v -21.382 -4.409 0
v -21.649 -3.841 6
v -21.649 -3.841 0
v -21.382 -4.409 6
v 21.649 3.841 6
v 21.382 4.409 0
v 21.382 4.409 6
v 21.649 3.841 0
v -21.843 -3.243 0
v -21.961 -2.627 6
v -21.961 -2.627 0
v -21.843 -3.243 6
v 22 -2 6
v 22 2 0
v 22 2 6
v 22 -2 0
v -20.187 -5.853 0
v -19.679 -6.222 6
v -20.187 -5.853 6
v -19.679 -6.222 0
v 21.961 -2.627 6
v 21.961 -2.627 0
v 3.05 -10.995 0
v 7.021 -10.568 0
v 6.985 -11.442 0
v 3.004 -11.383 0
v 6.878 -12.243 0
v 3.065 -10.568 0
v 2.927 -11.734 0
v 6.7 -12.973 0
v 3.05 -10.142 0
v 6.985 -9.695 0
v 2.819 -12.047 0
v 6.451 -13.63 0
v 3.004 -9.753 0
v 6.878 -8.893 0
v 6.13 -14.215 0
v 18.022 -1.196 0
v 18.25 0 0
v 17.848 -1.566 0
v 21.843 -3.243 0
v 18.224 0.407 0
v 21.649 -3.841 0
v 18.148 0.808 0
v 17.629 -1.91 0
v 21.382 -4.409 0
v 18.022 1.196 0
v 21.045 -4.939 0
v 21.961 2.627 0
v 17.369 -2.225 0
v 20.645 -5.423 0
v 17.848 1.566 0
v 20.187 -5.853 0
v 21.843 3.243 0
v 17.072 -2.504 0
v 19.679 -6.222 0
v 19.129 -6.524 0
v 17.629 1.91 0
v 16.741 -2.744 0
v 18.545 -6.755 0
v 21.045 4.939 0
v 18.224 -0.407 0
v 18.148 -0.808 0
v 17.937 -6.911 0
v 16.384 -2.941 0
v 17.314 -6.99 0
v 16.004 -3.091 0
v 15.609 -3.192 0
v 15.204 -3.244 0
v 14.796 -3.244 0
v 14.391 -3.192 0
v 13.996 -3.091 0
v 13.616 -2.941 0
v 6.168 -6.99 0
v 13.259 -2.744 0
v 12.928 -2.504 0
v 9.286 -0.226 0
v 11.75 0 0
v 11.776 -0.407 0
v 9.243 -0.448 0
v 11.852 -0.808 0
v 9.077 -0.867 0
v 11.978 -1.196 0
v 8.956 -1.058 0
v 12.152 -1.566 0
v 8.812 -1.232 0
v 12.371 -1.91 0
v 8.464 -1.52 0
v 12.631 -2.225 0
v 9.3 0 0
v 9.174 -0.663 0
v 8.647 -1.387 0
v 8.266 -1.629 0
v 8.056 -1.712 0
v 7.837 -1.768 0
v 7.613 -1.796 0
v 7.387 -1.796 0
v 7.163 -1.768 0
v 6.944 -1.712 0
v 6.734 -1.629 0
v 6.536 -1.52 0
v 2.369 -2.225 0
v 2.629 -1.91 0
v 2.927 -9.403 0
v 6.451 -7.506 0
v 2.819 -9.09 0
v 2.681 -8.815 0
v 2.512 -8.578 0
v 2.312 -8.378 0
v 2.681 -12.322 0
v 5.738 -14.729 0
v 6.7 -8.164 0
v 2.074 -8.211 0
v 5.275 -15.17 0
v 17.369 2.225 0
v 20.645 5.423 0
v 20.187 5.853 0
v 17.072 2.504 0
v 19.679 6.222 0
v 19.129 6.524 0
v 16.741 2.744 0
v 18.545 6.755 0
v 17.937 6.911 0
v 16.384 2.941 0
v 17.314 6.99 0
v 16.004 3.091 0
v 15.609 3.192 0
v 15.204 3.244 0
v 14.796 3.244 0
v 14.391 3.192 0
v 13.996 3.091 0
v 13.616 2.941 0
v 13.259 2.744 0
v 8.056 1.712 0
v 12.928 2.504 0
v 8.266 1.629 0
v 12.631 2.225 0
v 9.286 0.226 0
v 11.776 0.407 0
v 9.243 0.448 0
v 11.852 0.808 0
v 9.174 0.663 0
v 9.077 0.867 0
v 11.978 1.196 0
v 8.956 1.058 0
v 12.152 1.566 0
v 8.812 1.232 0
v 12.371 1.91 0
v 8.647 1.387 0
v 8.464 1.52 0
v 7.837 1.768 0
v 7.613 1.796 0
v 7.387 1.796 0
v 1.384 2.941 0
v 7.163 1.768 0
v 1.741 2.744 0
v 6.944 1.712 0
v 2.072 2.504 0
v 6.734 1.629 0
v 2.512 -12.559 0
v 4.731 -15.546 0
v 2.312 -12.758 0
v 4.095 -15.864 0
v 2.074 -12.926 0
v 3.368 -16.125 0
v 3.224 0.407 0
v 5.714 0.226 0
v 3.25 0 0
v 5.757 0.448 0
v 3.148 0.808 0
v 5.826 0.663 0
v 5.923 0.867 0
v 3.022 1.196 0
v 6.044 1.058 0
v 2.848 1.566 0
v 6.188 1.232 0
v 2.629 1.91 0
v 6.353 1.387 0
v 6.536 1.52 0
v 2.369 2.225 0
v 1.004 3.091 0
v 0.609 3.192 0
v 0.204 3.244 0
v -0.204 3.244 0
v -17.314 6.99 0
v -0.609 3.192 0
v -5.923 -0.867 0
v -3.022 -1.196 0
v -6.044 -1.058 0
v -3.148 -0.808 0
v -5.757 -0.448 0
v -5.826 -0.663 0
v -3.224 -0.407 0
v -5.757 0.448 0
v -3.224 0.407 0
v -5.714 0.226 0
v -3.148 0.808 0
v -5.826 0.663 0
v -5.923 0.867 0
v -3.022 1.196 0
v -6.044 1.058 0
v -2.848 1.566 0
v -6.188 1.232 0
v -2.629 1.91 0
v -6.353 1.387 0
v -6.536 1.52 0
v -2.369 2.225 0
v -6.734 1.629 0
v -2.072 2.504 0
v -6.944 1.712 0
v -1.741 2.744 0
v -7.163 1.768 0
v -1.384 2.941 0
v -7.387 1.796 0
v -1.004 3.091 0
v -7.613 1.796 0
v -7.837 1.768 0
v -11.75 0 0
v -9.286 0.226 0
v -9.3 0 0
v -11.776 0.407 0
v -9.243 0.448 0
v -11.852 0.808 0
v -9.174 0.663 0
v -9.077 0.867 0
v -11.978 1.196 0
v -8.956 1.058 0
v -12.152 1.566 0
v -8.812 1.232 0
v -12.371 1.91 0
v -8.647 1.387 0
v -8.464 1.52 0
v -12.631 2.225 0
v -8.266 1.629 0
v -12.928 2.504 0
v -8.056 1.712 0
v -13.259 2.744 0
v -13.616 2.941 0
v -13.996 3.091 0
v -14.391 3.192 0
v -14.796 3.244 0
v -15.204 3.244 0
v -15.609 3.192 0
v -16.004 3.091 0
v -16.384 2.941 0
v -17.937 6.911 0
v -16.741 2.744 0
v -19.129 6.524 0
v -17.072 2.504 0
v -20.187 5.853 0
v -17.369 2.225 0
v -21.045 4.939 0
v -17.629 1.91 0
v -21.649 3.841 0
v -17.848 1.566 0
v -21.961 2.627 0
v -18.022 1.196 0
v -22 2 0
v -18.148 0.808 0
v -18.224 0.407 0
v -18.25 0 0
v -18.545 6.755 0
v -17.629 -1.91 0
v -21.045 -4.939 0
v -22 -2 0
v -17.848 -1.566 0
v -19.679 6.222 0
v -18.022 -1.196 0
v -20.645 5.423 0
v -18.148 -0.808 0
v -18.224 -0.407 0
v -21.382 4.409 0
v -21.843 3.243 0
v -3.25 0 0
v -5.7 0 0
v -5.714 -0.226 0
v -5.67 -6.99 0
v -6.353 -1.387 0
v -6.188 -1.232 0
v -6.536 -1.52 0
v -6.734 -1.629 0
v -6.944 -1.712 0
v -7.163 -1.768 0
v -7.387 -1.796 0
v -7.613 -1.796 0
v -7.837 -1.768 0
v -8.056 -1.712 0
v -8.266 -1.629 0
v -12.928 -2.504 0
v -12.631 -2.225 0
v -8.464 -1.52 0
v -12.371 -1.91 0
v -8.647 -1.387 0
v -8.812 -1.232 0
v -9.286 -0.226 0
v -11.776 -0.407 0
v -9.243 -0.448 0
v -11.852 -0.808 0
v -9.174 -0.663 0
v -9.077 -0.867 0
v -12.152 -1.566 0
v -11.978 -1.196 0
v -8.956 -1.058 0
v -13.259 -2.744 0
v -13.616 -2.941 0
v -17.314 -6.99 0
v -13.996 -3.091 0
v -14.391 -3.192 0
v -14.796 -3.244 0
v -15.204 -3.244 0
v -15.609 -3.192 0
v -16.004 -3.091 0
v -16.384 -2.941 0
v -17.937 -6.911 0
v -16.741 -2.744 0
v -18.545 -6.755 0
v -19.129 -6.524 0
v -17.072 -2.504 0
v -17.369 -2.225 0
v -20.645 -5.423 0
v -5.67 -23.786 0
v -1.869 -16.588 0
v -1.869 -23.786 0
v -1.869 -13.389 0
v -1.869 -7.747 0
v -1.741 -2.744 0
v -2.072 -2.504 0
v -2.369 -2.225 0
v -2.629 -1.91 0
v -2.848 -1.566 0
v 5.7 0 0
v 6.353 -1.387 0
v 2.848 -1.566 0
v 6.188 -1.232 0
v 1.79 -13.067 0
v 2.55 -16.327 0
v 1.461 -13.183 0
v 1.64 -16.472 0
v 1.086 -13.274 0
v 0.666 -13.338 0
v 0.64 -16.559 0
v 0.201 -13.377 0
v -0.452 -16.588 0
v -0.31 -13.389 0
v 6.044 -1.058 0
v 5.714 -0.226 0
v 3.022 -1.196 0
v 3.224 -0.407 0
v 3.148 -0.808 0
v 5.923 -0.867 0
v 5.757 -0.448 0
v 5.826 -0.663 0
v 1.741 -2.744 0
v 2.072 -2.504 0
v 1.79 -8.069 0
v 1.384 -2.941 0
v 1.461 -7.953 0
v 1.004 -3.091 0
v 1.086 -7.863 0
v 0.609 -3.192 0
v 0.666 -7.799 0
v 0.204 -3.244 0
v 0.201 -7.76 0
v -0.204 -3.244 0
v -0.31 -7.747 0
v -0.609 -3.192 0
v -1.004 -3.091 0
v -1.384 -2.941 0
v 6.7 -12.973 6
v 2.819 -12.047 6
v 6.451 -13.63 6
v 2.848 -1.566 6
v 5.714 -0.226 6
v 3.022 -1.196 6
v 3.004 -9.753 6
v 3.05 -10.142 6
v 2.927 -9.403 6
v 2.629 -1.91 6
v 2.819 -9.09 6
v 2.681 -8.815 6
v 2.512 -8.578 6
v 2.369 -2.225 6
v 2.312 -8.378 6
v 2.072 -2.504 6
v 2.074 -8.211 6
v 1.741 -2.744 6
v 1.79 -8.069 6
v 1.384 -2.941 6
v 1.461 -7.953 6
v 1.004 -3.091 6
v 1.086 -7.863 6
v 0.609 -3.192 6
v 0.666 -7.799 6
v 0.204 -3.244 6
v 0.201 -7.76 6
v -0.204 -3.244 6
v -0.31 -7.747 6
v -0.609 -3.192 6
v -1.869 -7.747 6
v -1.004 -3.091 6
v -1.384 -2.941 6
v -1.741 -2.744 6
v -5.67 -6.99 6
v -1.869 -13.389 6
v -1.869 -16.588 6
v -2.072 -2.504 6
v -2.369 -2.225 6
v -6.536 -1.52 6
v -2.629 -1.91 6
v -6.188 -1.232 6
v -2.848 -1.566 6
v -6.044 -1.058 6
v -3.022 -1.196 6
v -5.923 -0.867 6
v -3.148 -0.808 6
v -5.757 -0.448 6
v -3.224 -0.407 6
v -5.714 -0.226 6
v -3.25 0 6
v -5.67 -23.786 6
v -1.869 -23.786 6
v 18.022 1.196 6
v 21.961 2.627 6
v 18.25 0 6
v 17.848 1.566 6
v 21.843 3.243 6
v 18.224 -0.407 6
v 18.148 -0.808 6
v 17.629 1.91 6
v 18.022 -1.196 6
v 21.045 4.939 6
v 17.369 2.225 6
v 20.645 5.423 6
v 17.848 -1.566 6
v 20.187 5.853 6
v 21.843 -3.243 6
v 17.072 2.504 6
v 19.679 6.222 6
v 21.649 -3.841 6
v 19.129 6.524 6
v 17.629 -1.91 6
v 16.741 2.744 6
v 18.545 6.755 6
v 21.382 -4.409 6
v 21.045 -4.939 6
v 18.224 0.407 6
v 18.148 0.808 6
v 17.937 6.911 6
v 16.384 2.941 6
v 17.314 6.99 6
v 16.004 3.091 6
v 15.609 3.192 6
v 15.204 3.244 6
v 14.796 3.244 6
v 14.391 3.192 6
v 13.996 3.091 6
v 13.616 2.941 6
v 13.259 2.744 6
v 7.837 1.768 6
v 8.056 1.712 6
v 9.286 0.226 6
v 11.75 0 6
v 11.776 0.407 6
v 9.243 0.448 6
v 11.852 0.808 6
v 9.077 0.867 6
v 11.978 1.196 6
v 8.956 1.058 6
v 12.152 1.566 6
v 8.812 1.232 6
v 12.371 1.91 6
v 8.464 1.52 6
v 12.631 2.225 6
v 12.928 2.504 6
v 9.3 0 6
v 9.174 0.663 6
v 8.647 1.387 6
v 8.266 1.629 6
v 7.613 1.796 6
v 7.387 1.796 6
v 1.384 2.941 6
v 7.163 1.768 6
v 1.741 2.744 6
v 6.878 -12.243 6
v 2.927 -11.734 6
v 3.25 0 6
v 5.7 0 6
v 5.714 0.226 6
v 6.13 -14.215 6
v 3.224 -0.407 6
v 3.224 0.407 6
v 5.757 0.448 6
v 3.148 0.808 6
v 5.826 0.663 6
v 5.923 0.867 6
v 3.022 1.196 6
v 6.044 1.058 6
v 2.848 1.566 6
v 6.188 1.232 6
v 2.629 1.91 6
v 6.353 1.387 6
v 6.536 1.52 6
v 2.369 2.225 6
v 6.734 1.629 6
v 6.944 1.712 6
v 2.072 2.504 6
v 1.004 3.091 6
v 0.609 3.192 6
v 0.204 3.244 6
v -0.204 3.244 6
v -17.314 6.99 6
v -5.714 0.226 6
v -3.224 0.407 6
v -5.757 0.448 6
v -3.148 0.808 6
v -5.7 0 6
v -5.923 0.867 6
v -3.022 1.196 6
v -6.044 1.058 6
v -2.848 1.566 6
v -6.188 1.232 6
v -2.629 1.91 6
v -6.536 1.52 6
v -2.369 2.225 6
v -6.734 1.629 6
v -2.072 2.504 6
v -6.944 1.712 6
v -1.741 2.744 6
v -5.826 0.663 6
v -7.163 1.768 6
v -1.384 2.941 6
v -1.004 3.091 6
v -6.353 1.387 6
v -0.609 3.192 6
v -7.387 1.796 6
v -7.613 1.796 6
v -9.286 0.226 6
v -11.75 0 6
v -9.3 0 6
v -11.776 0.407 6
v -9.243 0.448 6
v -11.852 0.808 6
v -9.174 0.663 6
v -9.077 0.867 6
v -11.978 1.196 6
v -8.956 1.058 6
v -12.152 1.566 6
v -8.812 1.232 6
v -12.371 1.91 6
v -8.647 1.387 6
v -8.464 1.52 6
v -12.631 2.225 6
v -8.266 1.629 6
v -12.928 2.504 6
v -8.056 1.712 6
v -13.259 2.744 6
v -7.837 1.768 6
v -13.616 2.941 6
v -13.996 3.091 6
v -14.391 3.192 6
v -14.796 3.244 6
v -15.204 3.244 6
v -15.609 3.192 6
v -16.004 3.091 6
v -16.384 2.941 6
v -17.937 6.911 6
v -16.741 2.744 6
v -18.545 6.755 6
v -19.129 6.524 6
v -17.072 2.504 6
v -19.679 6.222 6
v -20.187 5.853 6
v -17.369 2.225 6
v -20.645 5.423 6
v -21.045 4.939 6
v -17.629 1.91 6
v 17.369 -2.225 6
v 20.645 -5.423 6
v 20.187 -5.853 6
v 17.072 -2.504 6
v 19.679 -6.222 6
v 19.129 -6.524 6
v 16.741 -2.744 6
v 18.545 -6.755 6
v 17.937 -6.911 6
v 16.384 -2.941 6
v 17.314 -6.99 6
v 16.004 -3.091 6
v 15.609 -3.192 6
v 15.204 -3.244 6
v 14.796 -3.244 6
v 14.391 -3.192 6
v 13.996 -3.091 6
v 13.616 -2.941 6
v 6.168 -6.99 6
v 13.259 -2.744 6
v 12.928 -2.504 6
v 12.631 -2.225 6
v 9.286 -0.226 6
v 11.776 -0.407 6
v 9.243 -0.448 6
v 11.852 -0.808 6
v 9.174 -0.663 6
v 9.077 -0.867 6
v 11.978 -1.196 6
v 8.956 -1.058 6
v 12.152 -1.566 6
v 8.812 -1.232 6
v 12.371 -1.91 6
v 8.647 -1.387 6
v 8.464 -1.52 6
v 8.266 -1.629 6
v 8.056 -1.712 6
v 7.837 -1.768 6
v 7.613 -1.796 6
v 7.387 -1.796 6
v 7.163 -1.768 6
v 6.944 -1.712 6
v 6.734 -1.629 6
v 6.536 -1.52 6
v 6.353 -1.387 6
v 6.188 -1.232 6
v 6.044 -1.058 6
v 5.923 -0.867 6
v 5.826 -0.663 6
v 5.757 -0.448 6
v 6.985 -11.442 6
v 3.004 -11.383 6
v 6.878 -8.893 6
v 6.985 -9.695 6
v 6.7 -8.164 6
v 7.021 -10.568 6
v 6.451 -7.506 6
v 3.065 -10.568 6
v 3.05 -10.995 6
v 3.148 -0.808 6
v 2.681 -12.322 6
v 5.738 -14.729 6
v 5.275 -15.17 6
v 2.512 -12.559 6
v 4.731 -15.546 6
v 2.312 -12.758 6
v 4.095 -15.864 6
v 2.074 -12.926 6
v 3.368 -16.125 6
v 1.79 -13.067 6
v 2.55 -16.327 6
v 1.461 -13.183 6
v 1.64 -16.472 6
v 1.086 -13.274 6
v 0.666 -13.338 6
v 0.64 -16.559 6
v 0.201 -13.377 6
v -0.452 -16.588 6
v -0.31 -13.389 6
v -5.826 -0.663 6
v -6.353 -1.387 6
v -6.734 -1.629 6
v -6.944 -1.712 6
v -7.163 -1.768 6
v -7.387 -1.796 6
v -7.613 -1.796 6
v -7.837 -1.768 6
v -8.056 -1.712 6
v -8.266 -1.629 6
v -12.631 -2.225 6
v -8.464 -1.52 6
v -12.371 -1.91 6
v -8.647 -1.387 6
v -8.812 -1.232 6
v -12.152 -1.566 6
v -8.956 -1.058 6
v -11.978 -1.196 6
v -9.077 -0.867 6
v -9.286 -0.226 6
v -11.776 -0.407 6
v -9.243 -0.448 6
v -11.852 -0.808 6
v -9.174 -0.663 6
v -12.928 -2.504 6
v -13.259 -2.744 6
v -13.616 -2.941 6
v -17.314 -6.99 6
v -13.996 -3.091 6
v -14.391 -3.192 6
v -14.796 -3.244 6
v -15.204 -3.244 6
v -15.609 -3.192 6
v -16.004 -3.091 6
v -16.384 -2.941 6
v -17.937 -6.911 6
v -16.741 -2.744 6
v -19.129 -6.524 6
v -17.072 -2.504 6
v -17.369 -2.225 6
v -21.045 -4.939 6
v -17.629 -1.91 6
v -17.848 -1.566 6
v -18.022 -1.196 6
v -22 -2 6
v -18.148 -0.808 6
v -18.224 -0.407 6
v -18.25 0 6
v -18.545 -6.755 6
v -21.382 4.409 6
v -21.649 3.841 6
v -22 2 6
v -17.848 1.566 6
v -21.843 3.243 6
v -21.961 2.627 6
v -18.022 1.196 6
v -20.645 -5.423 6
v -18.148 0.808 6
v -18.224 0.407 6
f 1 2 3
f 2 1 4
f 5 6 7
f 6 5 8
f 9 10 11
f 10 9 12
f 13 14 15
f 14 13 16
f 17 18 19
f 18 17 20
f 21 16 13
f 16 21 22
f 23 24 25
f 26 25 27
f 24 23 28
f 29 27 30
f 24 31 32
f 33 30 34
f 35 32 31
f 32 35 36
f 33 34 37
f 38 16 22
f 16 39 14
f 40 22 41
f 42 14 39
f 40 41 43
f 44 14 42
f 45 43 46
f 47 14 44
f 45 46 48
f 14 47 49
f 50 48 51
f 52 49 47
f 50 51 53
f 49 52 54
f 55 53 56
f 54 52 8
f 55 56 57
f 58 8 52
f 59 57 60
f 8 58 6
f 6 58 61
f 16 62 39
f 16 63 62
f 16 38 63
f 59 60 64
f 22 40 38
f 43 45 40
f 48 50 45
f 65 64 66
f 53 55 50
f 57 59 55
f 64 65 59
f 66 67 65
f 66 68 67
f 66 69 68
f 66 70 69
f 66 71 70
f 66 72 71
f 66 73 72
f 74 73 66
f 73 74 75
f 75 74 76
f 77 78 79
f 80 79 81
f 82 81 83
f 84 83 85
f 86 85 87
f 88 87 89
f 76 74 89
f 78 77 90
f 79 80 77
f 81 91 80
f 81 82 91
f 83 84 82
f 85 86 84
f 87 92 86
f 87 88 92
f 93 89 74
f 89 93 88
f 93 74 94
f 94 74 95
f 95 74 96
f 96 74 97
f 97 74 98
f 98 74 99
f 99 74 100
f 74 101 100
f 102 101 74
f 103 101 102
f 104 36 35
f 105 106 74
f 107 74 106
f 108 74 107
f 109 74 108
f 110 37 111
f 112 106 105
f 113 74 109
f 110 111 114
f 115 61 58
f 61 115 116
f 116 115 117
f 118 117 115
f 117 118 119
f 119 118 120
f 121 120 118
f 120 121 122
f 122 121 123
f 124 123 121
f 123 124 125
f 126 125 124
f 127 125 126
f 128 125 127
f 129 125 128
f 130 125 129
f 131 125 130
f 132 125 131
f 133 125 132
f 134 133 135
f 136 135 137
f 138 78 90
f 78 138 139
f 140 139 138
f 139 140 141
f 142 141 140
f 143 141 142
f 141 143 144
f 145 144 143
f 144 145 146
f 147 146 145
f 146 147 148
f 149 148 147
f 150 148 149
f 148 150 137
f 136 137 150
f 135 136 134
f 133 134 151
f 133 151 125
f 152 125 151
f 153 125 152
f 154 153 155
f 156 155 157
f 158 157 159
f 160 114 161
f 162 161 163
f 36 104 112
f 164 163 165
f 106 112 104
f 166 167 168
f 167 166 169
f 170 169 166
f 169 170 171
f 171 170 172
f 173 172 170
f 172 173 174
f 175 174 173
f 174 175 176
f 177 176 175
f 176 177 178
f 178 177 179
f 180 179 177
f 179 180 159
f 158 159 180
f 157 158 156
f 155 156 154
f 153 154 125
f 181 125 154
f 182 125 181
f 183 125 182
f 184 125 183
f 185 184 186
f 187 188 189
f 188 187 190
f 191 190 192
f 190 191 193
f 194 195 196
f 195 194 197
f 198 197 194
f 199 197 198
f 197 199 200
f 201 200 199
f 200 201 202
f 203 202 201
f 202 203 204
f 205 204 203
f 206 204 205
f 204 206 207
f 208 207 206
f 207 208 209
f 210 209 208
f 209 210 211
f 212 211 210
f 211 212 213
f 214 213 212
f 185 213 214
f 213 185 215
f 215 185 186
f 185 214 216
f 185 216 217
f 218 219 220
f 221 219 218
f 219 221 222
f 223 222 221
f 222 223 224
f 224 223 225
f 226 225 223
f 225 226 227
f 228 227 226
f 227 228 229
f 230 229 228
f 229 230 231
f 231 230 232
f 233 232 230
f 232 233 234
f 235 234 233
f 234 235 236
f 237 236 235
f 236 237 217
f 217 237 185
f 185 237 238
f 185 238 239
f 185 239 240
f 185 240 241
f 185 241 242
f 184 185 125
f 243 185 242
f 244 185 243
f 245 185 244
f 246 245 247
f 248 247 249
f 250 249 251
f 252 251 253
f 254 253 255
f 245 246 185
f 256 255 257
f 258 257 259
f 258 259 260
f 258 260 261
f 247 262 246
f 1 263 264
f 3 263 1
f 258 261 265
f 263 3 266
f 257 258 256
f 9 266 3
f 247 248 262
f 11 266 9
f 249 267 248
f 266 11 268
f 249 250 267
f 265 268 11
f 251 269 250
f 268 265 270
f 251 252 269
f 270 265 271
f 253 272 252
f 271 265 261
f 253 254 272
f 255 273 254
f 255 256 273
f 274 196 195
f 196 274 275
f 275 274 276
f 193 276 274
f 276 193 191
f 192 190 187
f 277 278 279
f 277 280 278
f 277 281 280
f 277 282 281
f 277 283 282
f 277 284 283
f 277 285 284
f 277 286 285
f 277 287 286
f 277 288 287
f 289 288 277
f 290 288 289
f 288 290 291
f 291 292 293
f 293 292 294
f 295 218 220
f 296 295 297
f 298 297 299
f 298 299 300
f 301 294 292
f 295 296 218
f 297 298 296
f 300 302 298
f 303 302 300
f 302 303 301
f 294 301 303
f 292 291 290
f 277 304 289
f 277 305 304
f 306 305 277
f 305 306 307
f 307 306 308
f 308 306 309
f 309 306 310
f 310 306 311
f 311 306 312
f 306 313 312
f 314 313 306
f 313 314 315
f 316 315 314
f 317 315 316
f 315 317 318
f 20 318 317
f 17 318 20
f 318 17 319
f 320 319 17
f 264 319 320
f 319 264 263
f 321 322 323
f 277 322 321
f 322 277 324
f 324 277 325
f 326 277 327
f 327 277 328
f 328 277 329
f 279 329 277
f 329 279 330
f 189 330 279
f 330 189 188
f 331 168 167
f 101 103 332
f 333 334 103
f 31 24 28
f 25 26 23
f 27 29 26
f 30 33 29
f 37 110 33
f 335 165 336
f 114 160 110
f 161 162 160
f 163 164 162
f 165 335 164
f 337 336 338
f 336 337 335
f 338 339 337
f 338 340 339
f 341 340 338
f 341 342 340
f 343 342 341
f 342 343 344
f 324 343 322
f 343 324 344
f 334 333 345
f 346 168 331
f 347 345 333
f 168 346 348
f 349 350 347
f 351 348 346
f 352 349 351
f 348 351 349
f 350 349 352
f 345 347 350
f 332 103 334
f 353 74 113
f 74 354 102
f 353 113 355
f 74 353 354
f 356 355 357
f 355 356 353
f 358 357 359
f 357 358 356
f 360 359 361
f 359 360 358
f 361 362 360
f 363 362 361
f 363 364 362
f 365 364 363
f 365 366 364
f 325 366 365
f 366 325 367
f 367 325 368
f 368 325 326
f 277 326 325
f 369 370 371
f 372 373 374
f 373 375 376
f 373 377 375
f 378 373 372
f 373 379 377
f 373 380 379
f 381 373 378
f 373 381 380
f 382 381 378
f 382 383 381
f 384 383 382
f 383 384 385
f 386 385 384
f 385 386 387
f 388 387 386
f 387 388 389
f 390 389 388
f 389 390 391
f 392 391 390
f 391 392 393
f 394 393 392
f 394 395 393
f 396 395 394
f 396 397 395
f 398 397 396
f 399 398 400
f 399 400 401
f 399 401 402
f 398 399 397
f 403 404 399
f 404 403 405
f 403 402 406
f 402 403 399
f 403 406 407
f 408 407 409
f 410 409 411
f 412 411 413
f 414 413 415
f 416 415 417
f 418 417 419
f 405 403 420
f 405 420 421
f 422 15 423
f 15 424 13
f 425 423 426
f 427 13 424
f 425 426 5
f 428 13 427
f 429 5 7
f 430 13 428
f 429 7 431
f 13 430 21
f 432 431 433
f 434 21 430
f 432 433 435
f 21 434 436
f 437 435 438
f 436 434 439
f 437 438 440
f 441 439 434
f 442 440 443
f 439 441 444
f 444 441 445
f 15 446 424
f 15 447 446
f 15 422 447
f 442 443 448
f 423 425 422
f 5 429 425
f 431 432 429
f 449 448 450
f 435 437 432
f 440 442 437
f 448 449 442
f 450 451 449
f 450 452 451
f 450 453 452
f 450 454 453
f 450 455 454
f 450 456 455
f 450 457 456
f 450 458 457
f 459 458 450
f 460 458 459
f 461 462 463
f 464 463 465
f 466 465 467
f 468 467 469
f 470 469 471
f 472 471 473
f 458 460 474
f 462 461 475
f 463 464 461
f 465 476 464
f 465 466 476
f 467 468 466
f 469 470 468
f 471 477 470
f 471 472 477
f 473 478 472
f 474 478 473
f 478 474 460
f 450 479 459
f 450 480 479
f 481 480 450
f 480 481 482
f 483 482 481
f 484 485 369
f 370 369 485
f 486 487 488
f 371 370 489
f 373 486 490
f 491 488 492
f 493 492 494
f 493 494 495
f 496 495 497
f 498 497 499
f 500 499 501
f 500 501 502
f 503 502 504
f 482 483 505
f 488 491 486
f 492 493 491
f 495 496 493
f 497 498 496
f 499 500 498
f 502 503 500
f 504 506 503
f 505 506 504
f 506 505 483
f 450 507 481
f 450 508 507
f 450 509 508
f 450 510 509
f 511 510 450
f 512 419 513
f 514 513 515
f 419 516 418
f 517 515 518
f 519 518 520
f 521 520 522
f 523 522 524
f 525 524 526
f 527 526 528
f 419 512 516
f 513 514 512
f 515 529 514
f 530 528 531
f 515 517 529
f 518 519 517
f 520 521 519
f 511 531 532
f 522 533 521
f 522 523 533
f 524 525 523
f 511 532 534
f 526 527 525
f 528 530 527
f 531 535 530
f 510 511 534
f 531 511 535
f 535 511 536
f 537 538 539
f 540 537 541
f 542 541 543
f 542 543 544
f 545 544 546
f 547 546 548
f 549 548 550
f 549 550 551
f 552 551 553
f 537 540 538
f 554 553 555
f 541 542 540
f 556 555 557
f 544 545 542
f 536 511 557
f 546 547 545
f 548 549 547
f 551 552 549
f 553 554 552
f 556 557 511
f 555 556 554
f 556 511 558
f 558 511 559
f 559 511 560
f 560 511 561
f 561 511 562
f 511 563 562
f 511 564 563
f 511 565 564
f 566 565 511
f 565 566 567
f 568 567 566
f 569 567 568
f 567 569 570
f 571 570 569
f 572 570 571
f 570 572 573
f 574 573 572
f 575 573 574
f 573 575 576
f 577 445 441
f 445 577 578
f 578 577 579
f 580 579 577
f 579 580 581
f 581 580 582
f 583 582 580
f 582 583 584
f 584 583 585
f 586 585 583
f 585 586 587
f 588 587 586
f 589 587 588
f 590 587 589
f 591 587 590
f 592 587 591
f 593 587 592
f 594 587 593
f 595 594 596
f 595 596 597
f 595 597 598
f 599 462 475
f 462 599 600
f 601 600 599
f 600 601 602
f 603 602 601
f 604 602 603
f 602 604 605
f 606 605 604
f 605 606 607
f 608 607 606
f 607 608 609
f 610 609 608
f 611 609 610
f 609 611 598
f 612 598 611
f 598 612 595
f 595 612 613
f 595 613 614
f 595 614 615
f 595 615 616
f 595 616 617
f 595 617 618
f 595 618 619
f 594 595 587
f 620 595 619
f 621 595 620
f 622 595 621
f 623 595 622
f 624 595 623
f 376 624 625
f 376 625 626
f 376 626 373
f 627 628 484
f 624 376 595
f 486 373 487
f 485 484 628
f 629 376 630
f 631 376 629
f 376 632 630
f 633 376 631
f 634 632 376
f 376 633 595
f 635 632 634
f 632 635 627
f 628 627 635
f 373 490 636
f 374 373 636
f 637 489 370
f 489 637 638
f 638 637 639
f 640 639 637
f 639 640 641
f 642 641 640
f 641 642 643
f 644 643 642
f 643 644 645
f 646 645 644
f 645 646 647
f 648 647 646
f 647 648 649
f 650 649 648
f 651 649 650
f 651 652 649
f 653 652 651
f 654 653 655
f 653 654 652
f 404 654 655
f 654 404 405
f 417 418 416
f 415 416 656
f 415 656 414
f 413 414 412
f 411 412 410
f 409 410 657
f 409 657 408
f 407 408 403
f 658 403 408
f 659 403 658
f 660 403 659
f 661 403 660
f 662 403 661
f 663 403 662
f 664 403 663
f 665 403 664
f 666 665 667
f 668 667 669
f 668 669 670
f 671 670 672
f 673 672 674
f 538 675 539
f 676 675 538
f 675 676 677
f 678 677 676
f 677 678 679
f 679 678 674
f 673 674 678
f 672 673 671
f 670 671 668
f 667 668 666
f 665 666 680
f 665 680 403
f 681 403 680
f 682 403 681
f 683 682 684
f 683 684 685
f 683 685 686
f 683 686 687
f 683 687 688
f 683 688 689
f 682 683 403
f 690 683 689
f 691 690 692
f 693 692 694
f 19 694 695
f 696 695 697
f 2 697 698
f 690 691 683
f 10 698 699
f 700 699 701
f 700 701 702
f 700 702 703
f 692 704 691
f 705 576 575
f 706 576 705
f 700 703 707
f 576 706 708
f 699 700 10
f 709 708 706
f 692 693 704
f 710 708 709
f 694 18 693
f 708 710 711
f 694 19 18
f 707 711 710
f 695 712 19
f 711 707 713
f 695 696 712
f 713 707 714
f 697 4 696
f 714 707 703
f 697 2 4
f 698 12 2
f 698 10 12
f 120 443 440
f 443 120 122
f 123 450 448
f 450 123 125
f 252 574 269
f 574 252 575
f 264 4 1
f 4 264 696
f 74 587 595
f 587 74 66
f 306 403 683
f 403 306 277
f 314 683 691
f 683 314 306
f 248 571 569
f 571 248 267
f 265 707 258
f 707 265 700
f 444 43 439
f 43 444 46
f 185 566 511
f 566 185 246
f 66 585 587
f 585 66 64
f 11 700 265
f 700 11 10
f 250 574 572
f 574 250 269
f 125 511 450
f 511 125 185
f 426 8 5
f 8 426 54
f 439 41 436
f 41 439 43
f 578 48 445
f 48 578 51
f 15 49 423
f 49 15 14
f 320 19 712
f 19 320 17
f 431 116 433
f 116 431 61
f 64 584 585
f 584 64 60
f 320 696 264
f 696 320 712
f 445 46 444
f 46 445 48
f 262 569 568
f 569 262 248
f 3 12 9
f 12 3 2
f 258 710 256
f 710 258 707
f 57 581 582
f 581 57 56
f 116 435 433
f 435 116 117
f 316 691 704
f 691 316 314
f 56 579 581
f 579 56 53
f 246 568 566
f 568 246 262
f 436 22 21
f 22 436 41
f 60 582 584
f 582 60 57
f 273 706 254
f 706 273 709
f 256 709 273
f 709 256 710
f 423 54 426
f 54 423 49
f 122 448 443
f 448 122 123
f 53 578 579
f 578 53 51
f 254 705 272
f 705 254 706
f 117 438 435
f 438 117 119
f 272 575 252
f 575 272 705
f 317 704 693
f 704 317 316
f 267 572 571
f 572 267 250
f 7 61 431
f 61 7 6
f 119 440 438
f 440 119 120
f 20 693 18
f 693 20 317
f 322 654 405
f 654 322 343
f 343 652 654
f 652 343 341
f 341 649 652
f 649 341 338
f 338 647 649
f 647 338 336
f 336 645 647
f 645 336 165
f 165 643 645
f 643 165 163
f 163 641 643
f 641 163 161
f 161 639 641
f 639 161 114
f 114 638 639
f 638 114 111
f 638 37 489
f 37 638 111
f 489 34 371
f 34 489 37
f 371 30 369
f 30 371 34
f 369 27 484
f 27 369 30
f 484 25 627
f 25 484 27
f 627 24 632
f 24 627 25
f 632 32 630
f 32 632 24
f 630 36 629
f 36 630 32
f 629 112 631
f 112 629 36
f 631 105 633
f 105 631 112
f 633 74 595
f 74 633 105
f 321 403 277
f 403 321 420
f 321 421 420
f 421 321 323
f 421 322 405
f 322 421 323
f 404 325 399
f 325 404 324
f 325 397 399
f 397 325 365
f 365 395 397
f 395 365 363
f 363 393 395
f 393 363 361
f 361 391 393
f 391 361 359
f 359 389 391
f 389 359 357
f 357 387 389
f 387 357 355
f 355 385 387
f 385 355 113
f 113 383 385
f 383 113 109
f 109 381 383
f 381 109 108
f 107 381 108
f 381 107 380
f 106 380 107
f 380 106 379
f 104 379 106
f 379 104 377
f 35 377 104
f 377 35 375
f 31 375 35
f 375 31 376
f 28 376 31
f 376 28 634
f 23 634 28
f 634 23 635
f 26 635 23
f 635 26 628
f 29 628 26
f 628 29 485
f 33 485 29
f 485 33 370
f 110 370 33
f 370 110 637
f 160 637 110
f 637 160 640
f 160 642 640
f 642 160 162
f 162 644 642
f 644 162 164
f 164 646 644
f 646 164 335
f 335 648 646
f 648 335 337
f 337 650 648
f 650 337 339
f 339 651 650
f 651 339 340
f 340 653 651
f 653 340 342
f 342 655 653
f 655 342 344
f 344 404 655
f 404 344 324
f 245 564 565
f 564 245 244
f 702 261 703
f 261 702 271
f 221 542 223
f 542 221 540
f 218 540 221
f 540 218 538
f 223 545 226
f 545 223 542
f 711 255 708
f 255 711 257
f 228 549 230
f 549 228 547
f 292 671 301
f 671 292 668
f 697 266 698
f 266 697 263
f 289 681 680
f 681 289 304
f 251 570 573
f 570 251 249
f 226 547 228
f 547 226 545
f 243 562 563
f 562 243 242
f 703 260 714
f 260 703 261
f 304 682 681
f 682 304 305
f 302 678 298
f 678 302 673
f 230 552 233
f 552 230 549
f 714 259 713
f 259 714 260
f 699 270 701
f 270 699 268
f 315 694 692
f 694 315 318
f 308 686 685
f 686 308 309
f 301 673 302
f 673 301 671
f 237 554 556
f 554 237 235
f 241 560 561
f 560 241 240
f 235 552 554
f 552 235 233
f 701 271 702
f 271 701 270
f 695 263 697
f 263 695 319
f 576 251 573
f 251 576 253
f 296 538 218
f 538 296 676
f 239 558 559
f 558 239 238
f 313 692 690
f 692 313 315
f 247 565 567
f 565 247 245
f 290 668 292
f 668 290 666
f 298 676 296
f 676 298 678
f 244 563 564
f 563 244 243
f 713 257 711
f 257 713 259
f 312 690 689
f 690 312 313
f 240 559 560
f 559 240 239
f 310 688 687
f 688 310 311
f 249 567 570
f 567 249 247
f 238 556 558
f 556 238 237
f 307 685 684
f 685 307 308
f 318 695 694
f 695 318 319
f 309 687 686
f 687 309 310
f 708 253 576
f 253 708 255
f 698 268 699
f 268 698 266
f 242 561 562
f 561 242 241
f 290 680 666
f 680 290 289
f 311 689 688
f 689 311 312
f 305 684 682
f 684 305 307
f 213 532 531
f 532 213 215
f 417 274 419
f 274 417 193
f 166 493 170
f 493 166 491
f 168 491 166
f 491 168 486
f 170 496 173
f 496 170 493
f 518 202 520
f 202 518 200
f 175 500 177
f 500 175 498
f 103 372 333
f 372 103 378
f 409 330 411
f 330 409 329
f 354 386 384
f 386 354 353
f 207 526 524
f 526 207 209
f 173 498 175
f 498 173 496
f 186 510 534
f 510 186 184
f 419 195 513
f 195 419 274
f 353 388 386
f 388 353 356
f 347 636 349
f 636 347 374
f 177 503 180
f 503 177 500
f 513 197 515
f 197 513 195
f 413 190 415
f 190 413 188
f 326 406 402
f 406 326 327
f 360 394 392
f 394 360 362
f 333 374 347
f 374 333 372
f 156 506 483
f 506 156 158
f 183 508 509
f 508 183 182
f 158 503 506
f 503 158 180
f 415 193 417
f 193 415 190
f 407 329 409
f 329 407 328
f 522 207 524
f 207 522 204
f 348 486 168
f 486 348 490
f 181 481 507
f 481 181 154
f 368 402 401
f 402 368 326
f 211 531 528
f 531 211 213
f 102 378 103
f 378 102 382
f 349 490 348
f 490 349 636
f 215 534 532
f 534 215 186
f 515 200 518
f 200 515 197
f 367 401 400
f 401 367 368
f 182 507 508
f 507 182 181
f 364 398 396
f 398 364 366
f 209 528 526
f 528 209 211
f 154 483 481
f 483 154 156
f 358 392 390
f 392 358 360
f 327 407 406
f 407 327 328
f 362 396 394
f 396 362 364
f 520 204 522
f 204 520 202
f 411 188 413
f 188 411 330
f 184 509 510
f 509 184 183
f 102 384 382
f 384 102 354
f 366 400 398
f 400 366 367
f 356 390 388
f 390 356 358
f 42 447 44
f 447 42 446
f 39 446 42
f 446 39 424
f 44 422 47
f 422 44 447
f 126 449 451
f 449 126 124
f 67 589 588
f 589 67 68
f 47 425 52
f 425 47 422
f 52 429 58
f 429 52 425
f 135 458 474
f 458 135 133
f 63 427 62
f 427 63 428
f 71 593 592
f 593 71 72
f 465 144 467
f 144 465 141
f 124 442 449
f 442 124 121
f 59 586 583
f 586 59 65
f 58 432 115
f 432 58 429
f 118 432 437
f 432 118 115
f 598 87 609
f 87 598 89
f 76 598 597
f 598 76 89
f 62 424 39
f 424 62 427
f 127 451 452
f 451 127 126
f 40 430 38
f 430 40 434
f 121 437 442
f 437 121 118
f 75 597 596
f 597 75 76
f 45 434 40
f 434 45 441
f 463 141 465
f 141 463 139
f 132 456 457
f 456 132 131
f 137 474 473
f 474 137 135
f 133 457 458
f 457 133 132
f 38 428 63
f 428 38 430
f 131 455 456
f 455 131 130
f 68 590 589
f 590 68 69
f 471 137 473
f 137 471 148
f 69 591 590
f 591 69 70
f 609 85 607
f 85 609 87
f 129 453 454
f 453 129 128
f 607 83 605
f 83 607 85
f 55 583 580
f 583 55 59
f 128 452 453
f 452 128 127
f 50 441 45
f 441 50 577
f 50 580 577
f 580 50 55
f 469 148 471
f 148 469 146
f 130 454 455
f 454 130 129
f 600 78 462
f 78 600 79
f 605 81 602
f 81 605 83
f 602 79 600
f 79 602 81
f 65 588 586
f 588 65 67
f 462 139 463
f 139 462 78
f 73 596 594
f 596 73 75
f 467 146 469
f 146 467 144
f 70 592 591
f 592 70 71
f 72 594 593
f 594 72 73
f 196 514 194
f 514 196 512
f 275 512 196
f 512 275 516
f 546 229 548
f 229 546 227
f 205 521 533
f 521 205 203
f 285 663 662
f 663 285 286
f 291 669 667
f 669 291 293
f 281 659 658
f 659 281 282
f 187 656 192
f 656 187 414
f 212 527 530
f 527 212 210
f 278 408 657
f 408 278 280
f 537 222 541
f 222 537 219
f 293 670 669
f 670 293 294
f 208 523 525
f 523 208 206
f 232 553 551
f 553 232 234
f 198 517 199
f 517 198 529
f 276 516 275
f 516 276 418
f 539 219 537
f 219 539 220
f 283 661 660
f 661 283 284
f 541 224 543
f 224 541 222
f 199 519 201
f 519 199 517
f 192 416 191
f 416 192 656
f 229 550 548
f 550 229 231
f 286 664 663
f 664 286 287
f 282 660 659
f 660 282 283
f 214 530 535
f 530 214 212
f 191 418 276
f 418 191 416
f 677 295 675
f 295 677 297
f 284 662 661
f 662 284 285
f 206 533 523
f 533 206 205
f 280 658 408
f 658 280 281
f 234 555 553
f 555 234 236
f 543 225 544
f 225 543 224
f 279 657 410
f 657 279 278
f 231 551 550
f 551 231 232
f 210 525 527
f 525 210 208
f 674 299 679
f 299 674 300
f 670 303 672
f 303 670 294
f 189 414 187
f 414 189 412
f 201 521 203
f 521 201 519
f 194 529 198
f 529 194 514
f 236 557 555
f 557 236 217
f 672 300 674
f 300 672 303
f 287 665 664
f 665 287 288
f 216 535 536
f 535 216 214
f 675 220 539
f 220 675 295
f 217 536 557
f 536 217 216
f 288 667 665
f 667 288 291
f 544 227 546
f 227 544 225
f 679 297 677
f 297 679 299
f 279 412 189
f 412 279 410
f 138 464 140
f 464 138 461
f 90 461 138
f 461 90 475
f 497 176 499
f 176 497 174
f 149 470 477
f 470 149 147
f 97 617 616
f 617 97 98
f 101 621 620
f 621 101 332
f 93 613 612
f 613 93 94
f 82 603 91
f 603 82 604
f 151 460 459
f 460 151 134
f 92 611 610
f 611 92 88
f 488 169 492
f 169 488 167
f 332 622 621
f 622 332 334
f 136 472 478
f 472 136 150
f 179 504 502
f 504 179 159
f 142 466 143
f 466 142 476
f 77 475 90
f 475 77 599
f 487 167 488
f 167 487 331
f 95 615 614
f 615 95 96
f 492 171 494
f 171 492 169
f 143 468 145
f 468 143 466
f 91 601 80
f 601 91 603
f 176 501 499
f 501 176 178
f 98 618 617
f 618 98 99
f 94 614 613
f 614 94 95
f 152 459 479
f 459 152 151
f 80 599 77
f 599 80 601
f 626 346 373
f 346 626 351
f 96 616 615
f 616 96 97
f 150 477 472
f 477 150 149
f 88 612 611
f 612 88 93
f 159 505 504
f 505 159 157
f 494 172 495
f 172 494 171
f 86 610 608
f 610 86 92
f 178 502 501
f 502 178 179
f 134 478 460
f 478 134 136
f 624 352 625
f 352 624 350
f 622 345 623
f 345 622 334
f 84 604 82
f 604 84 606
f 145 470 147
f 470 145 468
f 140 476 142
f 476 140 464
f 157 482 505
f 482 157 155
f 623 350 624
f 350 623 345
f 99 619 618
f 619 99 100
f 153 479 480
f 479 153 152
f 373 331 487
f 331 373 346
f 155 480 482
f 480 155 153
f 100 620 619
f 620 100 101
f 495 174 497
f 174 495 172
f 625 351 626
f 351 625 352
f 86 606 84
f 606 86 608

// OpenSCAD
$fn = 50;


difference() {
	union() {
		hull() {
			translate(v = [-17.0000000000, 2.0000000000, 0]) {
				cylinder(h = 6, r = 5);
			}
			translate(v = [17.0000000000, 2.0000000000, 0]) {
				cylinder(h = 6, r = 5);
			}
			translate(v = [-17.0000000000, -2.0000000000, 0]) {
				cylinder(h = 6, r = 5);
			}
			translate(v = [17.0000000000, -2.0000000000, 0]) {
				cylinder(h = 6, r = 5);
			}
		}
		translate(v = [0, -5, 0]) {
			linear_extrude(height = 6) {
				text(font = "DejaVu Sans Mono:style=Bold", halign = "center", size = 19.0000000000, text = "P", valign = "top");
			}
		}
	}
	union() {
		translate(v = [-15.0000000000, 0.0000000000, 0]) {
			translate(v = [0, 0, -100]) {
				cylinder(h = 200, r = 3.2500000000);
			}
		}
		translate(v = [0, 0, -100]) {
			cylinder(h = 200, r = 3.2500000000);
		}
		translate(v = [15.0000000000, 0.0000000000, 0]) {
			translate(v = [0, 0, -100]) {
				cylinder(h = 200, r = 3.2500000000);
			}
		}
		translate(v = [-15.0000000000, 0.0000000000, 0]) {
			translate(v = [0, 0, -100]) {
				cylinder(h = 200, r = 1.8000000000);
			}
		}
		translate(v = [-7.5000000000, 0.0000000000, 0]) {
			translate(v = [0, 0, -100]) {
				cylinder(h = 200, r = 1.8000000000);
			}
		}
		translate(v = [0, 0, -100]) {
			cylinder(h = 200, r = 1.8000000000);
		}
		translate(v = [7.5000000000, 0.0000000000, 0]) {
			translate(v = [0, 0, -100]) {
				cylinder(h = 200, r = 1.8000000000);
			}
		}
		translate(v = [15.0000000000, 0.0000000000, 0]) {
			translate(v = [0, 0, -100]) {
				cylinder(h = 200, r = 1.8000000000);
			}
		}
	}
}
